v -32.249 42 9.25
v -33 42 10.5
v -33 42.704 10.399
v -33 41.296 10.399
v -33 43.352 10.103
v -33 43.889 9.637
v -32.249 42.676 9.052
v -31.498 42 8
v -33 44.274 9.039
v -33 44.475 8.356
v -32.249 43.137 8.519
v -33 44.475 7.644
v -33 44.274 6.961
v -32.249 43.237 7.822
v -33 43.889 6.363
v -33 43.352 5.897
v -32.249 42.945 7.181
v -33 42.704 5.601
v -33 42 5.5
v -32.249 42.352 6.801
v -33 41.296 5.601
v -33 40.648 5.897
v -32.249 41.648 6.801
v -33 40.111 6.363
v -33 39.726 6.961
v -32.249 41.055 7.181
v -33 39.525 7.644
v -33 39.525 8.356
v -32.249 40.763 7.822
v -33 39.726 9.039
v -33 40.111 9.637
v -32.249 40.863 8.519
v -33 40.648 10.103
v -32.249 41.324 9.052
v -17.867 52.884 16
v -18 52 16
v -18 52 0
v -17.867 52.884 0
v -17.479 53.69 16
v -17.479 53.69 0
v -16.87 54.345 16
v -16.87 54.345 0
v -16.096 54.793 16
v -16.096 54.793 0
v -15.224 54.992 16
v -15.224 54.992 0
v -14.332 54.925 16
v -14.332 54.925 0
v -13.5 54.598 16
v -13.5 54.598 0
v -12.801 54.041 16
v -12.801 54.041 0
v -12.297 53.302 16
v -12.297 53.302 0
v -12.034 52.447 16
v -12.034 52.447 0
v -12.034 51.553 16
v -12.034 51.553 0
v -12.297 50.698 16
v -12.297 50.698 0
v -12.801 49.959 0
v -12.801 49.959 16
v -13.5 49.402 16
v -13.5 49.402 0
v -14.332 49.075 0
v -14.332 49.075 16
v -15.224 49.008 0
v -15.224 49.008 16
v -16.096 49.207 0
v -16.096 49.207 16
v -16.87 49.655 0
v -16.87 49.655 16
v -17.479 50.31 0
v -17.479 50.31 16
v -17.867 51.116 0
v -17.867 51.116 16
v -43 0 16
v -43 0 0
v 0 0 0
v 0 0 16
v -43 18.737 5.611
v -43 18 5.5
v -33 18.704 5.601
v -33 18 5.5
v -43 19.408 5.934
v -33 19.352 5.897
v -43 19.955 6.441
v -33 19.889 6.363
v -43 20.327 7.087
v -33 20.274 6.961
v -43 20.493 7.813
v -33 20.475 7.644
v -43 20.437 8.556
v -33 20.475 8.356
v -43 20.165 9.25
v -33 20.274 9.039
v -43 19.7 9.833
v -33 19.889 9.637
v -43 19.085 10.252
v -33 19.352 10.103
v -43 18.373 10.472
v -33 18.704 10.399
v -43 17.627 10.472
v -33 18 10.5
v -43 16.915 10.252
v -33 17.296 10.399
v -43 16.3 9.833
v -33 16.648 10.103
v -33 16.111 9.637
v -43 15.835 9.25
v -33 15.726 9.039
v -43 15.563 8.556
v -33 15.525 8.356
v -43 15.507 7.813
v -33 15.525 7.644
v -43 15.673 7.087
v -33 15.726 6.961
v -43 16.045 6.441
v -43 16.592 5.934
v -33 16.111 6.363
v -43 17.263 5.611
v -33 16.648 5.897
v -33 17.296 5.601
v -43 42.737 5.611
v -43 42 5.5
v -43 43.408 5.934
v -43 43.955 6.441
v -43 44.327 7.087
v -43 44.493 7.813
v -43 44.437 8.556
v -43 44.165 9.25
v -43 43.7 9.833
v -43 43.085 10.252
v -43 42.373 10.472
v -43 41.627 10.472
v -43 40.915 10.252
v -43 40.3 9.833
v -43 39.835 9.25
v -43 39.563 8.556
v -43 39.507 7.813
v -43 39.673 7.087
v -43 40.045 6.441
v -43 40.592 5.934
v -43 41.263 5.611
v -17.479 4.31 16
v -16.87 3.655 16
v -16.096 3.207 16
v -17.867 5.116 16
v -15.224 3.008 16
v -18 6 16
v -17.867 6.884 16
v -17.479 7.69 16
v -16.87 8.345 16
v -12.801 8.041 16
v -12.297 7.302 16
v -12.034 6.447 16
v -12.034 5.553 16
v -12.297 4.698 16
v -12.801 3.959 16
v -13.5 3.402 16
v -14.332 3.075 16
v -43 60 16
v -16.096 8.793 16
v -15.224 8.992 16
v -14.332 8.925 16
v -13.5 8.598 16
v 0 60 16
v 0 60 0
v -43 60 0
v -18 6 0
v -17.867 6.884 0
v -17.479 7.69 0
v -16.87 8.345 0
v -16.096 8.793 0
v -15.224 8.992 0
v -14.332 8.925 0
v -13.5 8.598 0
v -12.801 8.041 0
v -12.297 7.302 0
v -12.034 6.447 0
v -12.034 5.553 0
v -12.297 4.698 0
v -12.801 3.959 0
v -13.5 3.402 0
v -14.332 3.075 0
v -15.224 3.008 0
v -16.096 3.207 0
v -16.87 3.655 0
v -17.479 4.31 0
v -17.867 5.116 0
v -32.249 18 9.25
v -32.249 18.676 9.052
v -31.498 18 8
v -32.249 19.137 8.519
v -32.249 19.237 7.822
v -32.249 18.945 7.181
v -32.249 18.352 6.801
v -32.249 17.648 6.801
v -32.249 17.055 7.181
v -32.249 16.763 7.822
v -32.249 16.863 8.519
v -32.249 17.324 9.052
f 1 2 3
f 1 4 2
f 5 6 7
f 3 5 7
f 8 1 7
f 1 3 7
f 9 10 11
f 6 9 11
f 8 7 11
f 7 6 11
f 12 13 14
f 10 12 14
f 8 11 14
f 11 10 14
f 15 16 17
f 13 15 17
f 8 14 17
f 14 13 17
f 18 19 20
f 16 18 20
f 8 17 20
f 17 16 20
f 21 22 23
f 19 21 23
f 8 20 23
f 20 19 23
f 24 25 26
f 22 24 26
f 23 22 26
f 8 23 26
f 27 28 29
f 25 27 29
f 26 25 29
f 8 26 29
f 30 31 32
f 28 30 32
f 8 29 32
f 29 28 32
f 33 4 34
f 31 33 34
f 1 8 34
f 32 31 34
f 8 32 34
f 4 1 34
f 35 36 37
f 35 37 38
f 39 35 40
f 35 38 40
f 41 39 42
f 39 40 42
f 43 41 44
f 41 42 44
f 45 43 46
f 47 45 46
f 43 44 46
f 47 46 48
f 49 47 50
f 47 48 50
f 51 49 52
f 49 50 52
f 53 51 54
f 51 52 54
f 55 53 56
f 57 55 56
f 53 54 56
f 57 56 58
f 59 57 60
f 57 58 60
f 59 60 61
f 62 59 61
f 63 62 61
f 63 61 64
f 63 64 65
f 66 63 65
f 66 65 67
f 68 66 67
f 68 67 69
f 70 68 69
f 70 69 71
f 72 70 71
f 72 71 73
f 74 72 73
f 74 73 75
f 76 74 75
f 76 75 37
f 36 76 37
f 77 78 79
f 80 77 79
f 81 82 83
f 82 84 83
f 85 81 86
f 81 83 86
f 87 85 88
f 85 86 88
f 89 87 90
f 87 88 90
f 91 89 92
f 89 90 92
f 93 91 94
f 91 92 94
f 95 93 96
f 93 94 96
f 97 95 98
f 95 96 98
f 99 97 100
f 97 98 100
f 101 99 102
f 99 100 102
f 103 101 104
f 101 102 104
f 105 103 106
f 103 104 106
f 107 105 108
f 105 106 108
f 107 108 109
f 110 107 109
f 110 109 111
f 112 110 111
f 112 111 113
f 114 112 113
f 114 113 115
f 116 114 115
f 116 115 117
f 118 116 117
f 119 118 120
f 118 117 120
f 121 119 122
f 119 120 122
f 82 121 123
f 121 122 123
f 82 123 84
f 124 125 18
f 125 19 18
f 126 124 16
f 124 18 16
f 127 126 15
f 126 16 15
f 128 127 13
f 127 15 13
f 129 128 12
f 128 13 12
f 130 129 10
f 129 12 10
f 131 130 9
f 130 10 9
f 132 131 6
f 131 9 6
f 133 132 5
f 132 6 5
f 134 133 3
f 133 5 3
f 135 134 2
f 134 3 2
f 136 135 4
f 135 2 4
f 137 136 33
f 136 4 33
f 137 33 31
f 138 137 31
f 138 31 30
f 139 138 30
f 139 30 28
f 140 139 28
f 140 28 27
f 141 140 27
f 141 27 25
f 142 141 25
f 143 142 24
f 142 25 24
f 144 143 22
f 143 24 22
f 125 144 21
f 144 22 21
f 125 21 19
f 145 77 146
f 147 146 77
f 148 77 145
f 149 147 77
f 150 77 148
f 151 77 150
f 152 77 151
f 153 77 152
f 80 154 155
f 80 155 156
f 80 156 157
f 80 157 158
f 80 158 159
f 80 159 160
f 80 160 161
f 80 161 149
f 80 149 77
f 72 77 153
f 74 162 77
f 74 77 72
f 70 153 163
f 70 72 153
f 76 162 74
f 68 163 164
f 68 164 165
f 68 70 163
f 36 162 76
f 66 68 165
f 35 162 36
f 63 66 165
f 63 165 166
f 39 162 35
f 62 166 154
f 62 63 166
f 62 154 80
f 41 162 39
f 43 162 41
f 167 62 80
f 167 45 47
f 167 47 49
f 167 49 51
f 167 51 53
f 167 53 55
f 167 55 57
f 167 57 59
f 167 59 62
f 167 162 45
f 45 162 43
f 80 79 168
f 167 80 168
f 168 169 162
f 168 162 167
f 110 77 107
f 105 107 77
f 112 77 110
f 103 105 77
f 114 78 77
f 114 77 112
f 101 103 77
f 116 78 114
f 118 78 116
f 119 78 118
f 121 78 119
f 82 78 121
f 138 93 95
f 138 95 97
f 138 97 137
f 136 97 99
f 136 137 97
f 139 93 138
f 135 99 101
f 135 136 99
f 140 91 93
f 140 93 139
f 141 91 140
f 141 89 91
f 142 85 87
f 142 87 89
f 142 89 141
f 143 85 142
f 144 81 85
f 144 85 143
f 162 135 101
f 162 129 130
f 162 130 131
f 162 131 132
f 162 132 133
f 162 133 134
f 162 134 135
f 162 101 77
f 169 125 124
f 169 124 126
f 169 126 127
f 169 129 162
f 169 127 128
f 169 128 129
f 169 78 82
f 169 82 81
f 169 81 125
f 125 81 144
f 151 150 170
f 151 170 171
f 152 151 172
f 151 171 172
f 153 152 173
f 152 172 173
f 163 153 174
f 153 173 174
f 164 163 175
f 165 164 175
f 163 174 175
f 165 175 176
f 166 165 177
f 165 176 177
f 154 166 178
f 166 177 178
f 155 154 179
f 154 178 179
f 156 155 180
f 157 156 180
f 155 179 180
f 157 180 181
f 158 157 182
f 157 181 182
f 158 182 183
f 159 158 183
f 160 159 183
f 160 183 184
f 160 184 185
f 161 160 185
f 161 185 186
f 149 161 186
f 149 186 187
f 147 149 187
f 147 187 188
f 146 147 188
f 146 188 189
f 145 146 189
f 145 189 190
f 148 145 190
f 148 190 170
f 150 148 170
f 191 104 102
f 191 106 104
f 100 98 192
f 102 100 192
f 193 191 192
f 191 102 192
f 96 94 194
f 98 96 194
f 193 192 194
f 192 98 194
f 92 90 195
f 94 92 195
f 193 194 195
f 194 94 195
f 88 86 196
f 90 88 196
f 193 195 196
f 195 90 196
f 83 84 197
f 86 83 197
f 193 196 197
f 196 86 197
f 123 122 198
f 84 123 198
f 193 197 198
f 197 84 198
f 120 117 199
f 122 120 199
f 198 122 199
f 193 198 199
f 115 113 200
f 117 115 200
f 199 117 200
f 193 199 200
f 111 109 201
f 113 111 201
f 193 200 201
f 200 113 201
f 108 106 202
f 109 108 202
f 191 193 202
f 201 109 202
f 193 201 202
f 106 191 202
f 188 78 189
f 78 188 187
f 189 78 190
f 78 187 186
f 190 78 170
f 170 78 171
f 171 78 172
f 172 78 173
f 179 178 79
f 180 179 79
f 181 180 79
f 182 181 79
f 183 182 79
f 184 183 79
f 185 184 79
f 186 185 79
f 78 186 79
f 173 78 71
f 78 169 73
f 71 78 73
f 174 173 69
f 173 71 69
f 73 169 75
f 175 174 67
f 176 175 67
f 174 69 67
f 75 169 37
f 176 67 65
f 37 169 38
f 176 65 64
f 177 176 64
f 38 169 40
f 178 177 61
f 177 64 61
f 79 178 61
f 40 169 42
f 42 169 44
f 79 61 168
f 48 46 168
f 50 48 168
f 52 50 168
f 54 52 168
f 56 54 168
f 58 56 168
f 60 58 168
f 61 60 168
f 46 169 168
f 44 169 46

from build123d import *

# Parameters (mm, degrees)
SKETCH_1_W             = 43
SKETCH_1_H             = 60
EXTRUDE_3_DEPTH        = 16
SKETCH_2_R             = 3
CUT_EXTRUDE_1_DEPTH    = 76.531450403
HOLE_WIZARD_M6_1_D     = 5
HOLE_WIZARD_M6_1_DEPTH = 10
HOLE_WIZARD_M6_1_TIP   = 1.502151548


with BuildPart() as part:
    # 草图1 → 凸台-拉伸3 (new body)
    with BuildSketch(Plane.XY):
        with Locations((-21.5, 30)):
            Rectangle(SKETCH_1_W, SKETCH_1_H)
    extrude(amount=EXTRUDE_3_DEPTH)

    # 草图2 → 切除-拉伸1 (cut, through all)
    with BuildSketch(Plane(origin=(0, 0, 0), x_dir=(-1, 0, 0), z_dir=(0, 0, -1))):
        with Locations((15, 52)):
            Circle(SKETCH_2_R)
        with Locations((15, 6)):
            Circle(SKETCH_2_R)
    extrude(amount=-CUT_EXTRUDE_1_DEPTH, mode=Mode.SUBTRACT)

    # M6 螺纹孔1
    with Locations(Plane.ZY.offset(43)):
        with Locations((8, 42), (8, 18)):
            Hole(HOLE_WIZARD_M6_1_D / 2, depth=HOLE_WIZARD_M6_1_DEPTH)
            with Locations((0, 0, -(HOLE_WIZARD_M6_1_DEPTH + HOLE_WIZARD_M6_1_TIP / 2))):  # 118° drill point
                Cone(0, HOLE_WIZARD_M6_1_D / 2, HOLE_WIZARD_M6_1_TIP, mode=Mode.SUBTRACT)


solid = part.part
